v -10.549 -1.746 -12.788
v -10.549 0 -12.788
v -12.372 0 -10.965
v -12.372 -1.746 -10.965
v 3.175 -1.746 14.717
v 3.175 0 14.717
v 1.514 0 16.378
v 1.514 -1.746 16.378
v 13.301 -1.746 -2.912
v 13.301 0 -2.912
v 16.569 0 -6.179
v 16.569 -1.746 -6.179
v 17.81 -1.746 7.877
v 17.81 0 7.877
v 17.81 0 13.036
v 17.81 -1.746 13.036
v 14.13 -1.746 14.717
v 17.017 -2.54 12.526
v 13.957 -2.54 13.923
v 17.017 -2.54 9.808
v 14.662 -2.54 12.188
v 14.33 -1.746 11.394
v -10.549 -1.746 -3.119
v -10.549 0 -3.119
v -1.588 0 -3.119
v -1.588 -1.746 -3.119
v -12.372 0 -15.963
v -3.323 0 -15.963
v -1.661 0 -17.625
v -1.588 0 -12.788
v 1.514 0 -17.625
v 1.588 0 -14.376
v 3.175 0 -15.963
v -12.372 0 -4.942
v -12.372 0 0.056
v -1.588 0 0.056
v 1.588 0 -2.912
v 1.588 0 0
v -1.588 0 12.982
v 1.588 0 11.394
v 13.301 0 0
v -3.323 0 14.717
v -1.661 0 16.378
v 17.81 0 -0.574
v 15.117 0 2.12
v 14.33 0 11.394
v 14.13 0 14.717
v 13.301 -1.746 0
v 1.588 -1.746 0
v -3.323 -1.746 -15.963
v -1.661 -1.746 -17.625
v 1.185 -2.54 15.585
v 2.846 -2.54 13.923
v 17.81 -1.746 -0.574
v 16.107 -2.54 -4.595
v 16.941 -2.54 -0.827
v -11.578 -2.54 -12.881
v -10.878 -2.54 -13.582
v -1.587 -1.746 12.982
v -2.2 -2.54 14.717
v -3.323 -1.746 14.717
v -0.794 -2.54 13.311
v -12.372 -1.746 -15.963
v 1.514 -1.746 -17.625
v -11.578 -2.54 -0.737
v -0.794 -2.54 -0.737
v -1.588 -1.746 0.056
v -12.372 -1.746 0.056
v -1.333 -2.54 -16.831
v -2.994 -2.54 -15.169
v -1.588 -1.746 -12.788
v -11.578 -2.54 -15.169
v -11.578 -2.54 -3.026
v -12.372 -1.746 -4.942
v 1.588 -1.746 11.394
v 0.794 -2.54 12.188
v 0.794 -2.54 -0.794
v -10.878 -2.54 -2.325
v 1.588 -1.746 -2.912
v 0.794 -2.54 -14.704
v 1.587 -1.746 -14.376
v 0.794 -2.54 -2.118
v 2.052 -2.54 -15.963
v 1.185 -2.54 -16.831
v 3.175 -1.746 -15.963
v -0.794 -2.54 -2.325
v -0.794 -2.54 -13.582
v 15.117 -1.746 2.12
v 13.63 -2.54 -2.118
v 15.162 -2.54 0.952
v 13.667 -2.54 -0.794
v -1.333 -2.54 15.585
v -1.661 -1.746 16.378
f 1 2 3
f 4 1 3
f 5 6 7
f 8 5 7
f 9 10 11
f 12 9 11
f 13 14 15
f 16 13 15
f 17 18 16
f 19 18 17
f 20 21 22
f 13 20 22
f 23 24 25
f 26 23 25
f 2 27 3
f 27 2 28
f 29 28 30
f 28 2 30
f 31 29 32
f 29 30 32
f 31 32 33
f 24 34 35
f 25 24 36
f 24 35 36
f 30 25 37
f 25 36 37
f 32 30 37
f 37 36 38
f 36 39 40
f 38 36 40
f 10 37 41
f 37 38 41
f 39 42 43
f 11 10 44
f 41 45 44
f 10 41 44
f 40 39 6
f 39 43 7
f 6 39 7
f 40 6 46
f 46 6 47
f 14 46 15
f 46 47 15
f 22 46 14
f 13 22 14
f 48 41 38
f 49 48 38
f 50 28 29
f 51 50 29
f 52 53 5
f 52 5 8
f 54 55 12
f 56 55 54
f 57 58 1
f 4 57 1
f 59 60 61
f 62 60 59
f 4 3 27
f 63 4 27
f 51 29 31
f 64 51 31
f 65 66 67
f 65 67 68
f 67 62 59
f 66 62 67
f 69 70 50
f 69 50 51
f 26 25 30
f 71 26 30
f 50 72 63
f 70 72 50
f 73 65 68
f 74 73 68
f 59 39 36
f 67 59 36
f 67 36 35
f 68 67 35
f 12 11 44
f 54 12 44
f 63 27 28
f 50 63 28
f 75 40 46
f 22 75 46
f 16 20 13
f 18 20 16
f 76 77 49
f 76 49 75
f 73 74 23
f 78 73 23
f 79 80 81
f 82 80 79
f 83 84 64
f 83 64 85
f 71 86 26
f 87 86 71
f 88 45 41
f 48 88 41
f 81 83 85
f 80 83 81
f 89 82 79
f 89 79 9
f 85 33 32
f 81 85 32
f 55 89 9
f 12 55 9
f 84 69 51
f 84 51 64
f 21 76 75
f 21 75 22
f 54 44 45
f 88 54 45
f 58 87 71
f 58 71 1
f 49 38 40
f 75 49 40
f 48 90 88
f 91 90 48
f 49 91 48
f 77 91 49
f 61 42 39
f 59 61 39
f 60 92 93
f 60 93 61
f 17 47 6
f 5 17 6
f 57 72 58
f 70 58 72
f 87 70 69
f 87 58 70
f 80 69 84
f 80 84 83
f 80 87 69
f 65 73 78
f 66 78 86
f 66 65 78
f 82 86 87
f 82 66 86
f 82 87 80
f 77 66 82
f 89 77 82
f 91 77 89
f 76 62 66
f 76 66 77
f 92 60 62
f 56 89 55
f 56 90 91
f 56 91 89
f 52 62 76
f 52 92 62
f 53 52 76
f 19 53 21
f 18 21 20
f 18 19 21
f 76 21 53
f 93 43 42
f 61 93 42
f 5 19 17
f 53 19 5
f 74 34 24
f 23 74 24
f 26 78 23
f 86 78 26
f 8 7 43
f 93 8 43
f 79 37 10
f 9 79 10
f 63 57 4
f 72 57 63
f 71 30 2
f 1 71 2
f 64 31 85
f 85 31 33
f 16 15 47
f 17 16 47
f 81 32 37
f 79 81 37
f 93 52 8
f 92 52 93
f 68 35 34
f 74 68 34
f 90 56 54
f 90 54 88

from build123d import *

# Parameters (mm, degrees)
F1_DEPTH = 5.08
F2_SIZE  = 1.5875
F3_SCALE = 0.5


with BuildPart() as f1:
    # F0 (on Front) → F1 (new body)
    with BuildSketch(Plane.XZ):
        Polygon((-6.6455395231, 29.4341069916), (-3.175, 25.9635674685), (-3.175, 0.1128360473), (-24.7444733058, 0.1128360473), (-24.7444733058, -9.883693457), (-21.0979438016, -6.2371639527), (-3.175, -6.2371639527), (-3.175, -25.5762760587), (-21.0979438016, -25.5762760587), (-24.7444733058, -21.9297465545), (-24.7444733058, -31.9262760587), (-22.1278171024, -31.9262760587), (-6.6455395231, -31.9262760587), (-3.3227697615, -35.2490458202), (3.0272302385, -35.2490458202), (6.35, -31.9262760587), (3.175, -28.7512760587), (3.175, -5.8234985377), (26.6026397626, -5.8234985377), (33.1378690898, -12.3587278649), (35.6206595898, -1.1474714229), (30.2332143891, 4.2399737777), (26.6026397626, 0), (3.175, 0), (3.175, 22.7885674685), (28.6609344184, 22.7885674685), (35.6206595898, 15.7537590712), (35.6206595898, 26.0716768982), (28.2596744327, 29.4341069916), (6.35, 29.4341069916), (3.0272302385, 32.7568767531), (-3.3227697615, 32.7568767531), align=None)
    extrude(amount=F1_DEPTH)

    # F2
    f2_edges = [f1.edges().sort_by_distance(p)[0] for p in [
        (17.304837, -5.08, 29.434107),
        (4.688615, -5.08, 31.095492),
        (-0.14777, -5.08, 32.756877),
        (-4.984155, -5.08, 31.095492),
        (-4.91027, -5.08, 27.698837),
        (-3.175, -5.08, 13.038202),
        (-13.959737, -5.08, 0.112836),
        (-24.744473, -5.08, -4.885429),
        (-22.921209, -5.08, -8.060429),
        (-12.136472, -5.08, -6.237164),
        (-3.175, -5.08, -15.90672),
        (-12.136472, -5.08, -25.576276),
        (-22.921209, -5.08, -23.753011),
        (-24.744473, -5.08, -26.928011),
        (-15.695006, -5.08, -31.926276),
        (-4.984155, -5.08, -33.587661),
        (-0.14777, -5.08, -35.249046),
        (4.688615, -5.08, -33.587661),
        (4.7625, -5.08, -30.338776),
        (3.175, -5.08, -17.287387),
        (14.88882, -5.08, -5.823499),
        (29.870254, -5.08, -9.091113),
        (34.379264, -5.08, -6.7531),
        (32.926937, -5.08, 1.546251),
        (28.417927, -5.08, 2.119987),
        (14.88882, -5.08, 0),
        (3.175, -5.08, 11.394284),
        (15.917967, -5.08, 22.788567),
        (32.140797, -5.08, 19.271163),
        (35.62066, -5.08, 20.912718),
        (31.940167, -5.08, 27.752892),
    ]]
    chamfer(f2_edges, length=F2_SIZE)


with BuildPart() as f1_1:
    # F3: moved
    add(f1.part.scale(F3_SCALE))


solid = f1_1.part
